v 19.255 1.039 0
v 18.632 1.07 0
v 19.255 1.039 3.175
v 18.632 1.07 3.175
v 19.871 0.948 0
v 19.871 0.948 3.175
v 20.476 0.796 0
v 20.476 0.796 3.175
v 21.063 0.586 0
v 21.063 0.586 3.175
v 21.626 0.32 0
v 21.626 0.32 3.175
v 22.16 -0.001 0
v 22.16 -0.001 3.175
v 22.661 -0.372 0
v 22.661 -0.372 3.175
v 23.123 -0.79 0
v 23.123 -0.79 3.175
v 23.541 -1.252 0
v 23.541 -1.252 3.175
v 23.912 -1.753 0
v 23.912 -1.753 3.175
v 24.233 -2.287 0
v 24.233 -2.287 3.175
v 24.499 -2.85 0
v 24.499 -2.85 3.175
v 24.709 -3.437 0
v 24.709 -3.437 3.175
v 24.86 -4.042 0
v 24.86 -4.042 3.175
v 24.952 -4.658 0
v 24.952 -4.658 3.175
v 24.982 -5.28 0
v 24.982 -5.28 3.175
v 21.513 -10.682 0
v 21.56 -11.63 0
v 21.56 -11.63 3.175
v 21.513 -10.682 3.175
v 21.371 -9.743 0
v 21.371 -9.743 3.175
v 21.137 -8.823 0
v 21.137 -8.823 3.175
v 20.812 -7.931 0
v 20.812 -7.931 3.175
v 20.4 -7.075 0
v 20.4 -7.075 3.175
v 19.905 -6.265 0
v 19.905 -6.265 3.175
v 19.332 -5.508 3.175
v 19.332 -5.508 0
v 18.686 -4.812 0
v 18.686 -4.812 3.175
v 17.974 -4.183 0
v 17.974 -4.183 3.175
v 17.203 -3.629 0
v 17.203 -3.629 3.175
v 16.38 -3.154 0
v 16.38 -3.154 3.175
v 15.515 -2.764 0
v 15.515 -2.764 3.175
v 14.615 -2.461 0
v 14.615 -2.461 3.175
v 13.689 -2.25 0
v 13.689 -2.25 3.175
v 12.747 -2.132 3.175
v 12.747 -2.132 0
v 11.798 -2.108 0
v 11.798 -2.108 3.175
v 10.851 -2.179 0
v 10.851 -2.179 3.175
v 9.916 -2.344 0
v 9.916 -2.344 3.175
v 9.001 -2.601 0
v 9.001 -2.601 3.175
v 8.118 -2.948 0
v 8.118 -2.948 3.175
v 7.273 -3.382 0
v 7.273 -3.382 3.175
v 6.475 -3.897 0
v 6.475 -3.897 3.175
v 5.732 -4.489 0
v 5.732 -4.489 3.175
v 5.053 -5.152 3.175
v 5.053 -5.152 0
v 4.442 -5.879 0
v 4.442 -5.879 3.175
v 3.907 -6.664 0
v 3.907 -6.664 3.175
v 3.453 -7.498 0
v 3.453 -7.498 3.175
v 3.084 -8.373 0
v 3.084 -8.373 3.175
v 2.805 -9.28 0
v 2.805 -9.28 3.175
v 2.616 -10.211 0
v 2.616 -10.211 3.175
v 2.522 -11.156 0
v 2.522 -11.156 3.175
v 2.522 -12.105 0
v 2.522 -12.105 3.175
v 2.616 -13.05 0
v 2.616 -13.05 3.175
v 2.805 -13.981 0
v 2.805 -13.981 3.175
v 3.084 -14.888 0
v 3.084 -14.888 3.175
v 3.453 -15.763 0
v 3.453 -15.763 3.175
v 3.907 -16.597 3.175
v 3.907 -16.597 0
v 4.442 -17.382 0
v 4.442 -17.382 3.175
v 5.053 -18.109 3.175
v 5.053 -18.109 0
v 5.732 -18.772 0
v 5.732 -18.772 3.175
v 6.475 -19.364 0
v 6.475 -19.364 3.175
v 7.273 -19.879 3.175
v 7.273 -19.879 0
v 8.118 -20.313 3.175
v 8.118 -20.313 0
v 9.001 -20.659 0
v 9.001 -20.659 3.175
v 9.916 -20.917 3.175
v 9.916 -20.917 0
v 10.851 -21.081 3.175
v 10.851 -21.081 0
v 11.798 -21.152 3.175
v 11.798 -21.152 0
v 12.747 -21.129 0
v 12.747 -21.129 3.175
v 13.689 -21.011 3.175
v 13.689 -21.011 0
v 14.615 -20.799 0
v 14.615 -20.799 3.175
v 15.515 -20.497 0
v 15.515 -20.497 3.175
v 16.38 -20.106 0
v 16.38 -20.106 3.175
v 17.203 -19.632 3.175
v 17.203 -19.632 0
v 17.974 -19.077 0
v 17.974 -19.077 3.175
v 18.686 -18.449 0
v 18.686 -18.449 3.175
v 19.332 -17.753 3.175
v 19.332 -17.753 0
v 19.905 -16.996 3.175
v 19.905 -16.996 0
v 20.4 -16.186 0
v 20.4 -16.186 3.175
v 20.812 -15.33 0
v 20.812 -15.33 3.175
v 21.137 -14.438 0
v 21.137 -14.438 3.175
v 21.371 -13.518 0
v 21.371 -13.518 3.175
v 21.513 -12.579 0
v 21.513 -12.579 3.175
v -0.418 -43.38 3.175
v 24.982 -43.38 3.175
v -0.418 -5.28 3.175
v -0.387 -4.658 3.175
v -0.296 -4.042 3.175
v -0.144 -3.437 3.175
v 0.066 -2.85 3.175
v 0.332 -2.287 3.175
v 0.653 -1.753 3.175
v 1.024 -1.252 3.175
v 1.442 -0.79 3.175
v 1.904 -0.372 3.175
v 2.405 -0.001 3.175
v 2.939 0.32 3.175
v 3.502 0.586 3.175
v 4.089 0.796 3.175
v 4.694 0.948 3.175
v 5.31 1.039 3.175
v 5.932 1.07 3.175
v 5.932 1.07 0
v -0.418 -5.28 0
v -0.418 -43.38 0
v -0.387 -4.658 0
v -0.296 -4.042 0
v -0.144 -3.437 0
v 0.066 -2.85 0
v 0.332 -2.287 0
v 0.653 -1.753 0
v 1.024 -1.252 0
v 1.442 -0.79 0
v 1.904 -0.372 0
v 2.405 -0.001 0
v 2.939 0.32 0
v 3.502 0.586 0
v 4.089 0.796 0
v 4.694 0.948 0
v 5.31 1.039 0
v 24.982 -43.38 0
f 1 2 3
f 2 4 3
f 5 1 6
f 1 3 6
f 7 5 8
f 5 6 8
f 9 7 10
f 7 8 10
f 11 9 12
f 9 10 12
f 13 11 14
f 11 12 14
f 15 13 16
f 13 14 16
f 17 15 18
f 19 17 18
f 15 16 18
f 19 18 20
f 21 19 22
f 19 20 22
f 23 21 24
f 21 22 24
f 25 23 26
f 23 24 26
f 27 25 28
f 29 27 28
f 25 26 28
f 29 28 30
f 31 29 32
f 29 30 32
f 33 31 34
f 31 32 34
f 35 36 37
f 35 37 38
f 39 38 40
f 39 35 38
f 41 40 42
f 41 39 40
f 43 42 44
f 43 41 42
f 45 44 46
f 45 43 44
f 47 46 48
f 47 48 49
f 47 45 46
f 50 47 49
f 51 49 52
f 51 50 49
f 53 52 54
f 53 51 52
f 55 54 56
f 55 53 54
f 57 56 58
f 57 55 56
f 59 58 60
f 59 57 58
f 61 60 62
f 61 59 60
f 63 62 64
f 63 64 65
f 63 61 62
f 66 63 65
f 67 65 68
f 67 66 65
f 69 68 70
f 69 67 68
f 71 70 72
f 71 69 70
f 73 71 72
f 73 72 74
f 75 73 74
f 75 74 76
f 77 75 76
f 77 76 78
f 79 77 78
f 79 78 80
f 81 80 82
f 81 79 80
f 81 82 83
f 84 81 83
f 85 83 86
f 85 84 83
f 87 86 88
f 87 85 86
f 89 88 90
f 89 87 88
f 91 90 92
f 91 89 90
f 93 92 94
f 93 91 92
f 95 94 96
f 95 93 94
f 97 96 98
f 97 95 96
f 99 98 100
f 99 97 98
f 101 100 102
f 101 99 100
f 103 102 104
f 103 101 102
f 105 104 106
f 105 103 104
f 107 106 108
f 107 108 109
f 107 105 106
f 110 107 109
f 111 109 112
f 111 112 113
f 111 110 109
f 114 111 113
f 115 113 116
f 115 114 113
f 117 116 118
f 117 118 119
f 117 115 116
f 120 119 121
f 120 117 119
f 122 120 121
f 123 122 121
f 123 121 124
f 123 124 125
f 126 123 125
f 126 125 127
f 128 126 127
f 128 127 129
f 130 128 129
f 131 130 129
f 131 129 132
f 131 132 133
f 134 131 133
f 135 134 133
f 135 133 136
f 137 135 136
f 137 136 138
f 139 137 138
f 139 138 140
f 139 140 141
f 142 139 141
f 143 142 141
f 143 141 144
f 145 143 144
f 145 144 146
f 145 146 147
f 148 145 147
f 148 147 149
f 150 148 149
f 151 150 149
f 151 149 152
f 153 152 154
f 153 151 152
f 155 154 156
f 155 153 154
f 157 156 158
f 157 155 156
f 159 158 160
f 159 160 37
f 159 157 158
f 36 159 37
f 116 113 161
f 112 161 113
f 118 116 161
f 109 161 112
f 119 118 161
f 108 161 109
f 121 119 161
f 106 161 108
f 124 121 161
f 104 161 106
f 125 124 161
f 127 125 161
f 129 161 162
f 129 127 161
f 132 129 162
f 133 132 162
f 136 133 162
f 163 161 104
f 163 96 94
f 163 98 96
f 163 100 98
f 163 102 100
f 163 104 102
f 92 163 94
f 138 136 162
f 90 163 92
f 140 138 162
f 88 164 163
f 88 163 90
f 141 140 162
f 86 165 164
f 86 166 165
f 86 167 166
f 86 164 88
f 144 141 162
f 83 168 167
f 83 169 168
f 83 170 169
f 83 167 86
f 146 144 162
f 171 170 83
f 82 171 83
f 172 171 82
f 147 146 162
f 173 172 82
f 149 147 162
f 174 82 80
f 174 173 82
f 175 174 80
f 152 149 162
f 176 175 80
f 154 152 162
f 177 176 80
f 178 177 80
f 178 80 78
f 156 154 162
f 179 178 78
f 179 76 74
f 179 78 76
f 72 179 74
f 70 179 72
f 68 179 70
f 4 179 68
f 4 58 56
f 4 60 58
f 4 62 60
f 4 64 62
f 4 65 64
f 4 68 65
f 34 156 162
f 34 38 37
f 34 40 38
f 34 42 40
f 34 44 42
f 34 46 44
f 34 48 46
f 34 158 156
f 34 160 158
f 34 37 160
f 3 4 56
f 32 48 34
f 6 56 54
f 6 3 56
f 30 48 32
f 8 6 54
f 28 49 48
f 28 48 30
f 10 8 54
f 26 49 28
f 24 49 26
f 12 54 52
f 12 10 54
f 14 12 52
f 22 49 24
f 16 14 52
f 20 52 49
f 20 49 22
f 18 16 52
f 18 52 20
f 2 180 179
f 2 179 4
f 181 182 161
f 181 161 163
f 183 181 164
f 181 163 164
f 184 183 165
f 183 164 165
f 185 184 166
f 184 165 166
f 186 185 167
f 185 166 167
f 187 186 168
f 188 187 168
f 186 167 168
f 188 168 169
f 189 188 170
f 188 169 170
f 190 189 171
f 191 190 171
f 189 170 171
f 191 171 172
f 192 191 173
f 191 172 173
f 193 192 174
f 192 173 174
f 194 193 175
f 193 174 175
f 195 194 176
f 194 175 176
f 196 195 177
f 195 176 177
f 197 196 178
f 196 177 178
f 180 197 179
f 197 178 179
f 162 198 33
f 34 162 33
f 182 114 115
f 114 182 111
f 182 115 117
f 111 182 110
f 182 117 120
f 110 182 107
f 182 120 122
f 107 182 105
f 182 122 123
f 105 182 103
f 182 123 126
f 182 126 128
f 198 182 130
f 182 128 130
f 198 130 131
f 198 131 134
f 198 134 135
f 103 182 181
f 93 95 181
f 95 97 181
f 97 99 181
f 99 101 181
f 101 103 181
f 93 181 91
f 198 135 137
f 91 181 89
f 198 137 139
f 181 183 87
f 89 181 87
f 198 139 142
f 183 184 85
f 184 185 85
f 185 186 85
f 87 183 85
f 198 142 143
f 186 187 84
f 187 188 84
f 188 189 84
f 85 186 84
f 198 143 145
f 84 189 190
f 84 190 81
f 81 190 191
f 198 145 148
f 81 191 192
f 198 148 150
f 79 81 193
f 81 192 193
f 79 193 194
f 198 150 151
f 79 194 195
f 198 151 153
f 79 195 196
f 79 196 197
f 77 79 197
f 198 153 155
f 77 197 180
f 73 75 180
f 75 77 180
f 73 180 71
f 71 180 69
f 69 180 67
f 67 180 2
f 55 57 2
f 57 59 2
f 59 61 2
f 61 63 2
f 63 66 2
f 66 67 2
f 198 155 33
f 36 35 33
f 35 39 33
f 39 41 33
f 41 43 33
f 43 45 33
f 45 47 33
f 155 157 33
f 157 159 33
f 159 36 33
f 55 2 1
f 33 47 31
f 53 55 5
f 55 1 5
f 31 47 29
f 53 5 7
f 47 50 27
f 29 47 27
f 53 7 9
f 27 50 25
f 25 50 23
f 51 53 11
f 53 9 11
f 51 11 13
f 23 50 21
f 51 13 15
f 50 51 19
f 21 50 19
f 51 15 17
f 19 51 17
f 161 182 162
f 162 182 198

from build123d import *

# Parameters (mm, degrees)
SKETCH1_W           = 25.4
SKETCH1_H           = 44.45
SKETCH1_R           = 9.525
BOSS_EXTRUDE1_DEPTH = 3.175
FILLET1_R           = 6.35


with BuildPart() as part:
    # Sketch1 → Boss-Extrude1 (new body)
    with BuildSketch(Plane.XY):
        with Locations((12.282474227, -21.155412371)):
            Rectangle(SKETCH1_W, SKETCH1_H)
        with Locations((12.035016268, -11.630412371)):
            Circle(SKETCH1_R, mode=Mode.SUBTRACT)
    extrude(amount=BOSS_EXTRUDE1_DEPTH)

    # Fillet1
    fillet1_edges = [part.edges().sort_by_distance(p)[0] for p in [
        (-0.417525773, 1.069587629, 1.5875),
        (24.982474227, 1.069587629, 1.5875),
    ]]
    fillet(fillet1_edges, radius=FILLET1_R)


solid = part.part
